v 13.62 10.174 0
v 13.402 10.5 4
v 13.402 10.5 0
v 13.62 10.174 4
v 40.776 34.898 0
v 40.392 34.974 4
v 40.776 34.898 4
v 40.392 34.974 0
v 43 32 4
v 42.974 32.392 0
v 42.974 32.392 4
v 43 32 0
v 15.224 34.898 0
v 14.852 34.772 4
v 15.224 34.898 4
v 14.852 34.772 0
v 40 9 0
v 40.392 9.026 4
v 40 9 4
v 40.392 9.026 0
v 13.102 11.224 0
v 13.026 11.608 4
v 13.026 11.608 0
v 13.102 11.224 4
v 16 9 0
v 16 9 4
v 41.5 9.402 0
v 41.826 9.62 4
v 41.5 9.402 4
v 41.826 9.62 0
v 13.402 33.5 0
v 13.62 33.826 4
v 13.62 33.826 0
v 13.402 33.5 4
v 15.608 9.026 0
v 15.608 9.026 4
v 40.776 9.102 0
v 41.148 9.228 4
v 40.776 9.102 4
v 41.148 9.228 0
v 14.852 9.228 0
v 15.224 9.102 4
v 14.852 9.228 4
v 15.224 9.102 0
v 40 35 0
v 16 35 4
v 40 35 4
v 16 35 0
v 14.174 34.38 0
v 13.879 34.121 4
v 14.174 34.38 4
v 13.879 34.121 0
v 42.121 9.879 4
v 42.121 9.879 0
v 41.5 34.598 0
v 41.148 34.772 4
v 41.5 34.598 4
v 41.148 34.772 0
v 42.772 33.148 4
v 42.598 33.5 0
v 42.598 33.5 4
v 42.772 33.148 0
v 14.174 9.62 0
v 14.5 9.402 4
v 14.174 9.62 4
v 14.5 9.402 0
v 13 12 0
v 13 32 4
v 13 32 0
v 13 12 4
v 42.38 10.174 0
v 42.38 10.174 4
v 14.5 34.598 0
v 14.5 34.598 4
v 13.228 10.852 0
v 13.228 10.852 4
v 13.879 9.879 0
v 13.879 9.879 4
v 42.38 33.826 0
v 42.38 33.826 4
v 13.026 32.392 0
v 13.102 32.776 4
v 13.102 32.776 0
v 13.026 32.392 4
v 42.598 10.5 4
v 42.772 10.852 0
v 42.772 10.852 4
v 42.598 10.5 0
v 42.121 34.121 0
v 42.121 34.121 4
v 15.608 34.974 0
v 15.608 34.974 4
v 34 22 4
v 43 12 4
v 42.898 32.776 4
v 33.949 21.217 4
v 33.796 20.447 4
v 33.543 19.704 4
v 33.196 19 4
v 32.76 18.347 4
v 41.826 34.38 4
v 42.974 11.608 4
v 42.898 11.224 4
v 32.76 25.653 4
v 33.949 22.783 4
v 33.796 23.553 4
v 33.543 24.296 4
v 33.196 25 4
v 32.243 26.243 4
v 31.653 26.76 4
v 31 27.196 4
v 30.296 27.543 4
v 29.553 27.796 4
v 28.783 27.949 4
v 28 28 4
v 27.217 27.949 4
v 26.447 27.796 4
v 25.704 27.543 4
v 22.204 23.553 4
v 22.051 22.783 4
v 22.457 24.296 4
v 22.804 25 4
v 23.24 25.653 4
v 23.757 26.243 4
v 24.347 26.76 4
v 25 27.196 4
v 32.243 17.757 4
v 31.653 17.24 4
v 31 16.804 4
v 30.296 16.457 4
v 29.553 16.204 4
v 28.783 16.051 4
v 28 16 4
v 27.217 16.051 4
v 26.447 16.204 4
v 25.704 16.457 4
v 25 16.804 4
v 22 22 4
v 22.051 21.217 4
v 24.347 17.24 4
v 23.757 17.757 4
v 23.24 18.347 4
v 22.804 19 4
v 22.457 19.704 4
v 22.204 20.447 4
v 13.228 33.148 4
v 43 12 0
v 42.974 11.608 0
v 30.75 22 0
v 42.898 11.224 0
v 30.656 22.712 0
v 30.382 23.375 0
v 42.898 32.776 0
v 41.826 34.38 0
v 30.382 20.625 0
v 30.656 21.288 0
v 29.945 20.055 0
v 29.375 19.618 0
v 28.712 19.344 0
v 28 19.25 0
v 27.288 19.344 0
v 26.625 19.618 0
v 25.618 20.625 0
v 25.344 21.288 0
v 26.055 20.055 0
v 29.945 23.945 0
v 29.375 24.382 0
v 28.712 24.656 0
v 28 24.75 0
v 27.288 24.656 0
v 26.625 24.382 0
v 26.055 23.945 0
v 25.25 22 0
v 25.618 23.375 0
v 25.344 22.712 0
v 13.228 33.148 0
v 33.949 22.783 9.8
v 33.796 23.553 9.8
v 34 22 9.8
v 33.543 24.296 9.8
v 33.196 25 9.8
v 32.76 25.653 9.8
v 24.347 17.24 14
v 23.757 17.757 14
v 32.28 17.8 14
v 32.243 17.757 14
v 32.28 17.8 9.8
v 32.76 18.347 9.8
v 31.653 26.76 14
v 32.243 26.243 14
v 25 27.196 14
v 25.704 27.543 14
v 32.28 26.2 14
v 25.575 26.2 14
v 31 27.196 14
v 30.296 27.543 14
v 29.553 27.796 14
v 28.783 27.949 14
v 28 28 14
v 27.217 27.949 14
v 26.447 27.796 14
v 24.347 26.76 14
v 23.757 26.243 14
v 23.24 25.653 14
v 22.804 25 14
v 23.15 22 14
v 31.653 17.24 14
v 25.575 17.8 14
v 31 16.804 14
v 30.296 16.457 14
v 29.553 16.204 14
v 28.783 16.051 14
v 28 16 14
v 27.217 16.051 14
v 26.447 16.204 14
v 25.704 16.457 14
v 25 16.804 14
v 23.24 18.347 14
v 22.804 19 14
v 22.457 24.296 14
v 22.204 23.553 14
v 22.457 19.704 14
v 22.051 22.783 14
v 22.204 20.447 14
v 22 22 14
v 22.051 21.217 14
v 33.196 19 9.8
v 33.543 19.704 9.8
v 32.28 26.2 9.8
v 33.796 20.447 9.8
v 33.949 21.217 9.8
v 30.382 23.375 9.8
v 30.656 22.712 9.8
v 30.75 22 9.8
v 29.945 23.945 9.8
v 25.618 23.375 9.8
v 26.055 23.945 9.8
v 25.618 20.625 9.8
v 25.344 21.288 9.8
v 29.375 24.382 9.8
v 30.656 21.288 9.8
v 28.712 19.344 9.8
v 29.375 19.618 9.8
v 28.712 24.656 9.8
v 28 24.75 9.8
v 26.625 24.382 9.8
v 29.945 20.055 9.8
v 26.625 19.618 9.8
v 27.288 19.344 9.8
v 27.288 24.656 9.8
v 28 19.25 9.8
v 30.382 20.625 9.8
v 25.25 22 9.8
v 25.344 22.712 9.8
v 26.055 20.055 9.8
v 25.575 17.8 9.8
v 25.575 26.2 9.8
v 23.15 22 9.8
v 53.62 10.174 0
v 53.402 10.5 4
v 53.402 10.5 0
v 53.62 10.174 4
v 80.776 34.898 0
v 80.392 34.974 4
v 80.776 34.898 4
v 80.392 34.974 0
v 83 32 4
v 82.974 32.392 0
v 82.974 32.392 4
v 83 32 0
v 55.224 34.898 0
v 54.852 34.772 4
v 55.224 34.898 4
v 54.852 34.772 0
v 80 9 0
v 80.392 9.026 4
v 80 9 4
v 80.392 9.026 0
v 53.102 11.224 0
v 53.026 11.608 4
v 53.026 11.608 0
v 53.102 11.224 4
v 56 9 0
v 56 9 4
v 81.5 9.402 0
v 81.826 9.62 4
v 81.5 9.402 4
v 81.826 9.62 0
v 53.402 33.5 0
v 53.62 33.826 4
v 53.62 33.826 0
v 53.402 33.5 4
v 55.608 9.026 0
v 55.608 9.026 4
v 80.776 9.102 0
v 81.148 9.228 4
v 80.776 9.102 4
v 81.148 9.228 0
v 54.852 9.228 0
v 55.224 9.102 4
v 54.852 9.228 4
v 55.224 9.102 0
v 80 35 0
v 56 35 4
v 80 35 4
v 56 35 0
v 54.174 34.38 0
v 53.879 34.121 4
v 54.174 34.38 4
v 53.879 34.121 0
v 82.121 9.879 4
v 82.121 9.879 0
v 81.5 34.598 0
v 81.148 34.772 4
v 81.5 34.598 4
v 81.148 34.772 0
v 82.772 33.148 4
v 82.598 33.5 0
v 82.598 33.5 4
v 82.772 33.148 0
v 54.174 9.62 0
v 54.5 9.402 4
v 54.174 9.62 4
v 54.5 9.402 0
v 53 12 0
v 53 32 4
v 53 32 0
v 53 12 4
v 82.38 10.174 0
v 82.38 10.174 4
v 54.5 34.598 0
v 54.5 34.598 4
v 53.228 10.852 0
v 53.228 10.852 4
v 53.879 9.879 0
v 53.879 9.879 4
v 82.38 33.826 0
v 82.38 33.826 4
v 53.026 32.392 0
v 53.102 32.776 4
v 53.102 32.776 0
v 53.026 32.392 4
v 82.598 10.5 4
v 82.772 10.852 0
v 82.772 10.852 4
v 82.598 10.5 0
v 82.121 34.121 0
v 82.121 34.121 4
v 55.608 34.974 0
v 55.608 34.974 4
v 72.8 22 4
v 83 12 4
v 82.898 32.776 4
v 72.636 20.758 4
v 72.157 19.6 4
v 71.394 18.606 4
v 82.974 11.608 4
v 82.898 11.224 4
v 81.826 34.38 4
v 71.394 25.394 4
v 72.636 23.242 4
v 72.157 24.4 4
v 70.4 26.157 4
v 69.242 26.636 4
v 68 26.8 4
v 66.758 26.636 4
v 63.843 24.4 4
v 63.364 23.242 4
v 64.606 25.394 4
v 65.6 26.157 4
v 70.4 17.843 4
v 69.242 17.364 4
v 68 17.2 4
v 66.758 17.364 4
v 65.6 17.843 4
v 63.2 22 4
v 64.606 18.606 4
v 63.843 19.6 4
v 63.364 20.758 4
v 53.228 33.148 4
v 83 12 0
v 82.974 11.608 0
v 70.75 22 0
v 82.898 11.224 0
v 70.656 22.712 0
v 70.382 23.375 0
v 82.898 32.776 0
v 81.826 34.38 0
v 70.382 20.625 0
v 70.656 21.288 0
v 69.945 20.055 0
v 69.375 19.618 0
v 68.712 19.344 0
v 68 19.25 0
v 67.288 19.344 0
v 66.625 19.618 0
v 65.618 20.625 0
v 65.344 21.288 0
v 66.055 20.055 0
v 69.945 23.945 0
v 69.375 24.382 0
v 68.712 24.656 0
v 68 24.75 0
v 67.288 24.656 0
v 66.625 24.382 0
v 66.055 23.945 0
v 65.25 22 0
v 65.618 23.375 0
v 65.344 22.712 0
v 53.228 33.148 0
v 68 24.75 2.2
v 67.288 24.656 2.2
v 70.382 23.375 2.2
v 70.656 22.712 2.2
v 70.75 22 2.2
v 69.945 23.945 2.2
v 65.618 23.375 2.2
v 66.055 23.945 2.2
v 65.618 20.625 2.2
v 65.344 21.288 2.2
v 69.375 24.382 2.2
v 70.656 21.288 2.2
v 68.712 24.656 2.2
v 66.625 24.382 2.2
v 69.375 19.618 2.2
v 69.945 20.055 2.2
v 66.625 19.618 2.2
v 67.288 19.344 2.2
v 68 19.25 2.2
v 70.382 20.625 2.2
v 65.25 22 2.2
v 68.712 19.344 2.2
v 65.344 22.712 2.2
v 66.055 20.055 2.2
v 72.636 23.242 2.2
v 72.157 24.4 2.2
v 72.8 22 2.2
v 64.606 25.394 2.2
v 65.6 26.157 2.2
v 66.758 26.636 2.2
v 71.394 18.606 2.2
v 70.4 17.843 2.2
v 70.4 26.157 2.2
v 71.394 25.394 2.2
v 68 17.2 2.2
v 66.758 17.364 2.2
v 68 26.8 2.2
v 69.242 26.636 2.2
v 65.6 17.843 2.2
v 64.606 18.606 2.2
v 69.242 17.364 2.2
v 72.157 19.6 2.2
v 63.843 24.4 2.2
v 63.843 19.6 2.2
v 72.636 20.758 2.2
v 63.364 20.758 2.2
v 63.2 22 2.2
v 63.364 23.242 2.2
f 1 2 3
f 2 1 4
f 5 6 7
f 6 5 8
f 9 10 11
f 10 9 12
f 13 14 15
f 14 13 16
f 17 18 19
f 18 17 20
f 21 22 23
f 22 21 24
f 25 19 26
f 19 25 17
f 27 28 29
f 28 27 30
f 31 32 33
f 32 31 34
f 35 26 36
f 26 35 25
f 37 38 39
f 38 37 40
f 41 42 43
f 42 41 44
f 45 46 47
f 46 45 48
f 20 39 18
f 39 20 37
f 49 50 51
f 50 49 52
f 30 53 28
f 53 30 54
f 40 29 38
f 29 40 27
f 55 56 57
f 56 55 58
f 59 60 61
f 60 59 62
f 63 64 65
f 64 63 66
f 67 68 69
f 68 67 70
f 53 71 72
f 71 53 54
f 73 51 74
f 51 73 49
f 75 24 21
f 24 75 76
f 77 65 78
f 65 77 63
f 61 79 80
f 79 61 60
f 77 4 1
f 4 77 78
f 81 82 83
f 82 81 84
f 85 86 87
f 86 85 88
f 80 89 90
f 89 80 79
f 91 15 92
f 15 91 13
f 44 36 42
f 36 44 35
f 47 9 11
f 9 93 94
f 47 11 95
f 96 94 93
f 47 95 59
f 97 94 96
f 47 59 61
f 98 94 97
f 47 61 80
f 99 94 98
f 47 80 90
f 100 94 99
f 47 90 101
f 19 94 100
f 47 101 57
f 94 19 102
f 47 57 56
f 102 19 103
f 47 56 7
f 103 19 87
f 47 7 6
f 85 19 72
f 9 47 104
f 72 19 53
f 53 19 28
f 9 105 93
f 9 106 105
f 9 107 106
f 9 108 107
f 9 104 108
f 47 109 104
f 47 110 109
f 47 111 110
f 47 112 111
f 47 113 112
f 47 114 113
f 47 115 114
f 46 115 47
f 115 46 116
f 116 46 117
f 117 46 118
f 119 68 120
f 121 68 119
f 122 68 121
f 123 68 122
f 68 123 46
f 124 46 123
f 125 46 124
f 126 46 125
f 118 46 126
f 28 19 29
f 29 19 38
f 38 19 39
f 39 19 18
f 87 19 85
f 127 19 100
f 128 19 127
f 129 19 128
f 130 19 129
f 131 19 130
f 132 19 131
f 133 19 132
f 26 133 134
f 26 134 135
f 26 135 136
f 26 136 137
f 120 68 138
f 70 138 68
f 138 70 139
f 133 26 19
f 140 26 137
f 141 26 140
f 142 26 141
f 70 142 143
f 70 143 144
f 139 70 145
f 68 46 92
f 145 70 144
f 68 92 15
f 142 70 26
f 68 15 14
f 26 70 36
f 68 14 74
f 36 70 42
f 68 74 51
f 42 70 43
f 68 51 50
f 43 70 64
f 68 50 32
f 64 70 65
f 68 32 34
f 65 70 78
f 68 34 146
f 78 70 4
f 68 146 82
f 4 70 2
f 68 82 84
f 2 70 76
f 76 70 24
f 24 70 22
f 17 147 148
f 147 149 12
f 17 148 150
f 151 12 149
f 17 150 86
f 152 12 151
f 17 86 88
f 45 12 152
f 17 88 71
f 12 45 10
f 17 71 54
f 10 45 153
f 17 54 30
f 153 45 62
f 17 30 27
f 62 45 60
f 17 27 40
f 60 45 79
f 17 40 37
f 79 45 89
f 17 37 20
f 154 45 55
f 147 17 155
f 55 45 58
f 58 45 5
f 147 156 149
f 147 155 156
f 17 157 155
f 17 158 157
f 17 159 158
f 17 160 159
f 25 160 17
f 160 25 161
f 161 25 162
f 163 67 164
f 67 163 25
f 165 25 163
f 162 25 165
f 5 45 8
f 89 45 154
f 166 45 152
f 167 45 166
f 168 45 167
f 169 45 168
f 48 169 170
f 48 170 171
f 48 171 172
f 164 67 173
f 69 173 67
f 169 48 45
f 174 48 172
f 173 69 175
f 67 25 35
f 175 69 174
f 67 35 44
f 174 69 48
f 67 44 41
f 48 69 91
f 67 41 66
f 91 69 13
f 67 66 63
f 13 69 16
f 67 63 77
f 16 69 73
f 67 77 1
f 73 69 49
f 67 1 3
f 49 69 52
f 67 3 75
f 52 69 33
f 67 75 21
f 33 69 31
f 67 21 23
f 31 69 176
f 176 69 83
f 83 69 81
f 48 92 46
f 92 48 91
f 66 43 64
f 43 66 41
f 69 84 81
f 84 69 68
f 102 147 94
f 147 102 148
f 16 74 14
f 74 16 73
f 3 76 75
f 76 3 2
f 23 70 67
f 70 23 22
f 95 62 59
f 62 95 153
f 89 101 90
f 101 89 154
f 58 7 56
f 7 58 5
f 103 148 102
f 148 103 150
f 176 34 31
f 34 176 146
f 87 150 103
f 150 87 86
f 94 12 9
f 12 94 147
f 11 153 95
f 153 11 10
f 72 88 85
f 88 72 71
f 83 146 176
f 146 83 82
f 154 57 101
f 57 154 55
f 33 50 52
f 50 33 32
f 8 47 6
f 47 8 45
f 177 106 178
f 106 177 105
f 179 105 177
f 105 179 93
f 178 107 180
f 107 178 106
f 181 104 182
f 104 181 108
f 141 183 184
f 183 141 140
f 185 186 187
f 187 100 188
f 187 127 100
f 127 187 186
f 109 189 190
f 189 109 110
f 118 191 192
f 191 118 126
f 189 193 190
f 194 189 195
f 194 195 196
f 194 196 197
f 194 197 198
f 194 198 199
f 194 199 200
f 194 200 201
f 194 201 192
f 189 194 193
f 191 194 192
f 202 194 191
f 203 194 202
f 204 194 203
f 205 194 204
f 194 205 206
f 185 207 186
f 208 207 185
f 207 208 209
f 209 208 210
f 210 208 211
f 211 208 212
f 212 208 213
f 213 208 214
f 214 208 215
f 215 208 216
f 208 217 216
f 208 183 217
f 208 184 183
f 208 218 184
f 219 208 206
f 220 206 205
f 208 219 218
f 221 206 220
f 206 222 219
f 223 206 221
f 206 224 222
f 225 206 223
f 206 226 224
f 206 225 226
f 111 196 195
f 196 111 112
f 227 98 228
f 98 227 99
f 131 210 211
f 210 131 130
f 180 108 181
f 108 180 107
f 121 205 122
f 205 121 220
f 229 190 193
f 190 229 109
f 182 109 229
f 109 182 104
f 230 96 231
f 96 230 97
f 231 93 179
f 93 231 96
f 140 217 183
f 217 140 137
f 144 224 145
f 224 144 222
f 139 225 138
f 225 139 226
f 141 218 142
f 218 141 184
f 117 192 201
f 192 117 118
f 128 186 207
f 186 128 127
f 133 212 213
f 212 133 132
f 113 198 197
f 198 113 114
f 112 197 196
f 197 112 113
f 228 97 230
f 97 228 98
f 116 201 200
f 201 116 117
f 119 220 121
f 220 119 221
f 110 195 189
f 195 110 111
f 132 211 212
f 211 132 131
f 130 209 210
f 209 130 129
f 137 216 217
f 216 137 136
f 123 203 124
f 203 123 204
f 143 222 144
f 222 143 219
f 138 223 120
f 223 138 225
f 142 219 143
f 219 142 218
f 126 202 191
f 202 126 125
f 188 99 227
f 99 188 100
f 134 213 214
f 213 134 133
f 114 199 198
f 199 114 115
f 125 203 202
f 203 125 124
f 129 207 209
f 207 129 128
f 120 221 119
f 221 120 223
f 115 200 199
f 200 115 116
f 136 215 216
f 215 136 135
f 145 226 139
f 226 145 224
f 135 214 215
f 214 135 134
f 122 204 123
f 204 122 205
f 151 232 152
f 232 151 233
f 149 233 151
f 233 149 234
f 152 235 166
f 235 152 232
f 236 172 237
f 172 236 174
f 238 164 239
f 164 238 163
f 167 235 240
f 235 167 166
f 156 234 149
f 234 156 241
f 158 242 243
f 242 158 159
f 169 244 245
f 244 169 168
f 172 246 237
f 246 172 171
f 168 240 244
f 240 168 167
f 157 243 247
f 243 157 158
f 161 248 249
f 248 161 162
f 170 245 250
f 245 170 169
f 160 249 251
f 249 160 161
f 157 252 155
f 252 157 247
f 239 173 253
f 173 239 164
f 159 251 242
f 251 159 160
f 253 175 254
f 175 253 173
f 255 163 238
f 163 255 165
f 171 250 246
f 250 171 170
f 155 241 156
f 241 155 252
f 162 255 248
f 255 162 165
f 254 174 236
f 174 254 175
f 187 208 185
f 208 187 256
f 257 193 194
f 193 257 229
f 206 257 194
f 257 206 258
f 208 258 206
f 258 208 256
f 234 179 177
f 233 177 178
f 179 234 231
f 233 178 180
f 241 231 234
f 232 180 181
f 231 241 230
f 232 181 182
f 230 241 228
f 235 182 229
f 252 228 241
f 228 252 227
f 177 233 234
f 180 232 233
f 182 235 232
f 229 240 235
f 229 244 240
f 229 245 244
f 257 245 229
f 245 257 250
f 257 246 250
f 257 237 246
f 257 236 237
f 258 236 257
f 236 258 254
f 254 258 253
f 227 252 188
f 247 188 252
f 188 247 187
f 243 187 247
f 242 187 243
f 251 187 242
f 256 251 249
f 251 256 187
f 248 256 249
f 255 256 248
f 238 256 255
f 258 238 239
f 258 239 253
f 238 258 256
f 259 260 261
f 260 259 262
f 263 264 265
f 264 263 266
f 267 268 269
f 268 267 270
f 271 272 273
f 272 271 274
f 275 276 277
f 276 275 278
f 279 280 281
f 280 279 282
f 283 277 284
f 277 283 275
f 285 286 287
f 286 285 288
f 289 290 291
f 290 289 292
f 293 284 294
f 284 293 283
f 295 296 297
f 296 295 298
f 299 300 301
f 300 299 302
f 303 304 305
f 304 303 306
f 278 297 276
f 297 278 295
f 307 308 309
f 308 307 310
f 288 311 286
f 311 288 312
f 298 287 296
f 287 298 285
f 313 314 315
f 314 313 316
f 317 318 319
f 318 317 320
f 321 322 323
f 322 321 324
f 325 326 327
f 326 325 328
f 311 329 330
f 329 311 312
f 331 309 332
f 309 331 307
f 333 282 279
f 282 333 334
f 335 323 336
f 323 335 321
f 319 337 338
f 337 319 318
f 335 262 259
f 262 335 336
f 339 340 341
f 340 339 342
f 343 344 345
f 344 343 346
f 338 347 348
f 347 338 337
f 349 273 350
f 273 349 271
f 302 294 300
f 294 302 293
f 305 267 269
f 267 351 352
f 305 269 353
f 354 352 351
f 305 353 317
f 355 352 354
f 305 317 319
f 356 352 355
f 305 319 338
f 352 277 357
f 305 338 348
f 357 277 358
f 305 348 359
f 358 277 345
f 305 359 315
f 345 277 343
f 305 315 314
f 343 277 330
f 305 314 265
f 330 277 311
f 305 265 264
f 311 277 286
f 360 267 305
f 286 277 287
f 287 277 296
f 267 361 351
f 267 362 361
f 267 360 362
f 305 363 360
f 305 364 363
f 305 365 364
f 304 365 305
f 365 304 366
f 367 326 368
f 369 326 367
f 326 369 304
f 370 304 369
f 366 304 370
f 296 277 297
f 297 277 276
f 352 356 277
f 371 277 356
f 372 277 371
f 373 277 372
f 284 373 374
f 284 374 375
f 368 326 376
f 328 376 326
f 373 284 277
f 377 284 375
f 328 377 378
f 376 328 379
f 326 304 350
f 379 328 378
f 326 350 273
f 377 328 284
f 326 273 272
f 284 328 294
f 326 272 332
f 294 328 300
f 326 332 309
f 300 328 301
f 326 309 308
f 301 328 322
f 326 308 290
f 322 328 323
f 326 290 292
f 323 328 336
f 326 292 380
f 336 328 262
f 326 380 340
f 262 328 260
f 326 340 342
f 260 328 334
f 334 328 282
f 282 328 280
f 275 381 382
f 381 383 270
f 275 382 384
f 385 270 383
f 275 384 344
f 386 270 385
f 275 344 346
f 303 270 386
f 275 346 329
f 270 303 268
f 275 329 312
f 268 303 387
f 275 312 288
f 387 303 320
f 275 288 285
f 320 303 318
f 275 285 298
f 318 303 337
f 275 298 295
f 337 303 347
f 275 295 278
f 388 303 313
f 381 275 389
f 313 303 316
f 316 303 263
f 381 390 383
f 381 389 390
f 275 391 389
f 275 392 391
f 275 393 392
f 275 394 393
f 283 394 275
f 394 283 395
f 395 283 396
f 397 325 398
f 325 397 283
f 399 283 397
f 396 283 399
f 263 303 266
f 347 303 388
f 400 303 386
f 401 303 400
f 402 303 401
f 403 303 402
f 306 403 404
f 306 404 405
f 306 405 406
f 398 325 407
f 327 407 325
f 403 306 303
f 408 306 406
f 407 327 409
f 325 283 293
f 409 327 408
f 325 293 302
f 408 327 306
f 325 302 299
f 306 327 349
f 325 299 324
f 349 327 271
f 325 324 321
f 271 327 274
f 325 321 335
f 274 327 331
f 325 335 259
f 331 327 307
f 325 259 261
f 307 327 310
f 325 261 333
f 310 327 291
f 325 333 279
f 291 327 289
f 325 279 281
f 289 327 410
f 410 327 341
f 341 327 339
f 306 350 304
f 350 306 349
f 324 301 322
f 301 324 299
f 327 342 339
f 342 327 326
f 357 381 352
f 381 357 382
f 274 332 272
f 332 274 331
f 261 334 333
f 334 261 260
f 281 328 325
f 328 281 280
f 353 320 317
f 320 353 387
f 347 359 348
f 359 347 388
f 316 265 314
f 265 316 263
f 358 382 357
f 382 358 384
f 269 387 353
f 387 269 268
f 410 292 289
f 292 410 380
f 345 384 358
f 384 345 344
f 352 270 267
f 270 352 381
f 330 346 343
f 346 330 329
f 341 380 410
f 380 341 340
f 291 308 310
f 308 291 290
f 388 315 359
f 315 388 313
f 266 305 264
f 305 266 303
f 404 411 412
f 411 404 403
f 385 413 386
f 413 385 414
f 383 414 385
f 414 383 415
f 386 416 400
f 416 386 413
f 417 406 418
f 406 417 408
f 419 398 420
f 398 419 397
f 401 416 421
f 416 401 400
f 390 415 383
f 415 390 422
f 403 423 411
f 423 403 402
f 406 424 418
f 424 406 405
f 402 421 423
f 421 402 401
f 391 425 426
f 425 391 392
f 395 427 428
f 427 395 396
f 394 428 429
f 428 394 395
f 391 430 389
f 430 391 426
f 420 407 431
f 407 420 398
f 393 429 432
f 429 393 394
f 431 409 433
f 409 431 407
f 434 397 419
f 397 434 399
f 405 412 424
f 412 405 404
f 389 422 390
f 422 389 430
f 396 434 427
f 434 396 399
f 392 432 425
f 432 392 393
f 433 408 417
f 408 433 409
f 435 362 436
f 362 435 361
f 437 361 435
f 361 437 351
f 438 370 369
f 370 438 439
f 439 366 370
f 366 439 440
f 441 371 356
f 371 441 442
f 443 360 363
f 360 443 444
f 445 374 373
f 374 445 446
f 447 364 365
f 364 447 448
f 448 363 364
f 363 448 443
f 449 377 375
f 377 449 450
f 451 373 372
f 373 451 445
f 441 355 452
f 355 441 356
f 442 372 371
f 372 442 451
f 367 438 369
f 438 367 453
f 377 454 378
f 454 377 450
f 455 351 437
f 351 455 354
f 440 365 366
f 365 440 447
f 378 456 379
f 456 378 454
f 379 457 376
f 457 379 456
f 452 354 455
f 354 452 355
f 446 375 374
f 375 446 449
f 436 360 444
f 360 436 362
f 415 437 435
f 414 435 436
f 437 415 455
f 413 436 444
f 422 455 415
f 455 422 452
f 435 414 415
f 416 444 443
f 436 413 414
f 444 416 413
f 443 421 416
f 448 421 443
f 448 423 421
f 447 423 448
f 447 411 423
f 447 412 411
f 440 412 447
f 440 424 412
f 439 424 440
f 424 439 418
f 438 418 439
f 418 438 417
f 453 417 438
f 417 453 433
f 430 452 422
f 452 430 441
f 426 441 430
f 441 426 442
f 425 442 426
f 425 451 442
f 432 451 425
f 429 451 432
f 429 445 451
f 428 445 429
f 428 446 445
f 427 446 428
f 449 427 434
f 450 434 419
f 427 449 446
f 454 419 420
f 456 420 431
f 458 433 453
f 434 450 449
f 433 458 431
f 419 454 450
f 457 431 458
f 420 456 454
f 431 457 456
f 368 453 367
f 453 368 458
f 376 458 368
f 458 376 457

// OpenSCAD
/*
Sample 060: Schraubdom mit seitlicher Muttertasche — M5
Generated from the FDM Mechanical Sample Library.
Units: millimetres.

Override examples:
  openscad -o custom.stl -D 'view="plate"' -D 'render_fn=64' model.scad
  openscad -o preview.png -D 'view="assembly"' model.scad
*/
use <../../../library/fdm_mechanisms.scad>

render_fn = is_undef(render_fn) ? 48 : render_fn;
view = is_undef(view) ? "plate" : view;
$fn = render_fn;

sample_nuttrap_screw(
    view=view,
    screw_d=5.5,
    nut_flat=8.4,
    nut_h=4.2,
    head_d=9.6
);
